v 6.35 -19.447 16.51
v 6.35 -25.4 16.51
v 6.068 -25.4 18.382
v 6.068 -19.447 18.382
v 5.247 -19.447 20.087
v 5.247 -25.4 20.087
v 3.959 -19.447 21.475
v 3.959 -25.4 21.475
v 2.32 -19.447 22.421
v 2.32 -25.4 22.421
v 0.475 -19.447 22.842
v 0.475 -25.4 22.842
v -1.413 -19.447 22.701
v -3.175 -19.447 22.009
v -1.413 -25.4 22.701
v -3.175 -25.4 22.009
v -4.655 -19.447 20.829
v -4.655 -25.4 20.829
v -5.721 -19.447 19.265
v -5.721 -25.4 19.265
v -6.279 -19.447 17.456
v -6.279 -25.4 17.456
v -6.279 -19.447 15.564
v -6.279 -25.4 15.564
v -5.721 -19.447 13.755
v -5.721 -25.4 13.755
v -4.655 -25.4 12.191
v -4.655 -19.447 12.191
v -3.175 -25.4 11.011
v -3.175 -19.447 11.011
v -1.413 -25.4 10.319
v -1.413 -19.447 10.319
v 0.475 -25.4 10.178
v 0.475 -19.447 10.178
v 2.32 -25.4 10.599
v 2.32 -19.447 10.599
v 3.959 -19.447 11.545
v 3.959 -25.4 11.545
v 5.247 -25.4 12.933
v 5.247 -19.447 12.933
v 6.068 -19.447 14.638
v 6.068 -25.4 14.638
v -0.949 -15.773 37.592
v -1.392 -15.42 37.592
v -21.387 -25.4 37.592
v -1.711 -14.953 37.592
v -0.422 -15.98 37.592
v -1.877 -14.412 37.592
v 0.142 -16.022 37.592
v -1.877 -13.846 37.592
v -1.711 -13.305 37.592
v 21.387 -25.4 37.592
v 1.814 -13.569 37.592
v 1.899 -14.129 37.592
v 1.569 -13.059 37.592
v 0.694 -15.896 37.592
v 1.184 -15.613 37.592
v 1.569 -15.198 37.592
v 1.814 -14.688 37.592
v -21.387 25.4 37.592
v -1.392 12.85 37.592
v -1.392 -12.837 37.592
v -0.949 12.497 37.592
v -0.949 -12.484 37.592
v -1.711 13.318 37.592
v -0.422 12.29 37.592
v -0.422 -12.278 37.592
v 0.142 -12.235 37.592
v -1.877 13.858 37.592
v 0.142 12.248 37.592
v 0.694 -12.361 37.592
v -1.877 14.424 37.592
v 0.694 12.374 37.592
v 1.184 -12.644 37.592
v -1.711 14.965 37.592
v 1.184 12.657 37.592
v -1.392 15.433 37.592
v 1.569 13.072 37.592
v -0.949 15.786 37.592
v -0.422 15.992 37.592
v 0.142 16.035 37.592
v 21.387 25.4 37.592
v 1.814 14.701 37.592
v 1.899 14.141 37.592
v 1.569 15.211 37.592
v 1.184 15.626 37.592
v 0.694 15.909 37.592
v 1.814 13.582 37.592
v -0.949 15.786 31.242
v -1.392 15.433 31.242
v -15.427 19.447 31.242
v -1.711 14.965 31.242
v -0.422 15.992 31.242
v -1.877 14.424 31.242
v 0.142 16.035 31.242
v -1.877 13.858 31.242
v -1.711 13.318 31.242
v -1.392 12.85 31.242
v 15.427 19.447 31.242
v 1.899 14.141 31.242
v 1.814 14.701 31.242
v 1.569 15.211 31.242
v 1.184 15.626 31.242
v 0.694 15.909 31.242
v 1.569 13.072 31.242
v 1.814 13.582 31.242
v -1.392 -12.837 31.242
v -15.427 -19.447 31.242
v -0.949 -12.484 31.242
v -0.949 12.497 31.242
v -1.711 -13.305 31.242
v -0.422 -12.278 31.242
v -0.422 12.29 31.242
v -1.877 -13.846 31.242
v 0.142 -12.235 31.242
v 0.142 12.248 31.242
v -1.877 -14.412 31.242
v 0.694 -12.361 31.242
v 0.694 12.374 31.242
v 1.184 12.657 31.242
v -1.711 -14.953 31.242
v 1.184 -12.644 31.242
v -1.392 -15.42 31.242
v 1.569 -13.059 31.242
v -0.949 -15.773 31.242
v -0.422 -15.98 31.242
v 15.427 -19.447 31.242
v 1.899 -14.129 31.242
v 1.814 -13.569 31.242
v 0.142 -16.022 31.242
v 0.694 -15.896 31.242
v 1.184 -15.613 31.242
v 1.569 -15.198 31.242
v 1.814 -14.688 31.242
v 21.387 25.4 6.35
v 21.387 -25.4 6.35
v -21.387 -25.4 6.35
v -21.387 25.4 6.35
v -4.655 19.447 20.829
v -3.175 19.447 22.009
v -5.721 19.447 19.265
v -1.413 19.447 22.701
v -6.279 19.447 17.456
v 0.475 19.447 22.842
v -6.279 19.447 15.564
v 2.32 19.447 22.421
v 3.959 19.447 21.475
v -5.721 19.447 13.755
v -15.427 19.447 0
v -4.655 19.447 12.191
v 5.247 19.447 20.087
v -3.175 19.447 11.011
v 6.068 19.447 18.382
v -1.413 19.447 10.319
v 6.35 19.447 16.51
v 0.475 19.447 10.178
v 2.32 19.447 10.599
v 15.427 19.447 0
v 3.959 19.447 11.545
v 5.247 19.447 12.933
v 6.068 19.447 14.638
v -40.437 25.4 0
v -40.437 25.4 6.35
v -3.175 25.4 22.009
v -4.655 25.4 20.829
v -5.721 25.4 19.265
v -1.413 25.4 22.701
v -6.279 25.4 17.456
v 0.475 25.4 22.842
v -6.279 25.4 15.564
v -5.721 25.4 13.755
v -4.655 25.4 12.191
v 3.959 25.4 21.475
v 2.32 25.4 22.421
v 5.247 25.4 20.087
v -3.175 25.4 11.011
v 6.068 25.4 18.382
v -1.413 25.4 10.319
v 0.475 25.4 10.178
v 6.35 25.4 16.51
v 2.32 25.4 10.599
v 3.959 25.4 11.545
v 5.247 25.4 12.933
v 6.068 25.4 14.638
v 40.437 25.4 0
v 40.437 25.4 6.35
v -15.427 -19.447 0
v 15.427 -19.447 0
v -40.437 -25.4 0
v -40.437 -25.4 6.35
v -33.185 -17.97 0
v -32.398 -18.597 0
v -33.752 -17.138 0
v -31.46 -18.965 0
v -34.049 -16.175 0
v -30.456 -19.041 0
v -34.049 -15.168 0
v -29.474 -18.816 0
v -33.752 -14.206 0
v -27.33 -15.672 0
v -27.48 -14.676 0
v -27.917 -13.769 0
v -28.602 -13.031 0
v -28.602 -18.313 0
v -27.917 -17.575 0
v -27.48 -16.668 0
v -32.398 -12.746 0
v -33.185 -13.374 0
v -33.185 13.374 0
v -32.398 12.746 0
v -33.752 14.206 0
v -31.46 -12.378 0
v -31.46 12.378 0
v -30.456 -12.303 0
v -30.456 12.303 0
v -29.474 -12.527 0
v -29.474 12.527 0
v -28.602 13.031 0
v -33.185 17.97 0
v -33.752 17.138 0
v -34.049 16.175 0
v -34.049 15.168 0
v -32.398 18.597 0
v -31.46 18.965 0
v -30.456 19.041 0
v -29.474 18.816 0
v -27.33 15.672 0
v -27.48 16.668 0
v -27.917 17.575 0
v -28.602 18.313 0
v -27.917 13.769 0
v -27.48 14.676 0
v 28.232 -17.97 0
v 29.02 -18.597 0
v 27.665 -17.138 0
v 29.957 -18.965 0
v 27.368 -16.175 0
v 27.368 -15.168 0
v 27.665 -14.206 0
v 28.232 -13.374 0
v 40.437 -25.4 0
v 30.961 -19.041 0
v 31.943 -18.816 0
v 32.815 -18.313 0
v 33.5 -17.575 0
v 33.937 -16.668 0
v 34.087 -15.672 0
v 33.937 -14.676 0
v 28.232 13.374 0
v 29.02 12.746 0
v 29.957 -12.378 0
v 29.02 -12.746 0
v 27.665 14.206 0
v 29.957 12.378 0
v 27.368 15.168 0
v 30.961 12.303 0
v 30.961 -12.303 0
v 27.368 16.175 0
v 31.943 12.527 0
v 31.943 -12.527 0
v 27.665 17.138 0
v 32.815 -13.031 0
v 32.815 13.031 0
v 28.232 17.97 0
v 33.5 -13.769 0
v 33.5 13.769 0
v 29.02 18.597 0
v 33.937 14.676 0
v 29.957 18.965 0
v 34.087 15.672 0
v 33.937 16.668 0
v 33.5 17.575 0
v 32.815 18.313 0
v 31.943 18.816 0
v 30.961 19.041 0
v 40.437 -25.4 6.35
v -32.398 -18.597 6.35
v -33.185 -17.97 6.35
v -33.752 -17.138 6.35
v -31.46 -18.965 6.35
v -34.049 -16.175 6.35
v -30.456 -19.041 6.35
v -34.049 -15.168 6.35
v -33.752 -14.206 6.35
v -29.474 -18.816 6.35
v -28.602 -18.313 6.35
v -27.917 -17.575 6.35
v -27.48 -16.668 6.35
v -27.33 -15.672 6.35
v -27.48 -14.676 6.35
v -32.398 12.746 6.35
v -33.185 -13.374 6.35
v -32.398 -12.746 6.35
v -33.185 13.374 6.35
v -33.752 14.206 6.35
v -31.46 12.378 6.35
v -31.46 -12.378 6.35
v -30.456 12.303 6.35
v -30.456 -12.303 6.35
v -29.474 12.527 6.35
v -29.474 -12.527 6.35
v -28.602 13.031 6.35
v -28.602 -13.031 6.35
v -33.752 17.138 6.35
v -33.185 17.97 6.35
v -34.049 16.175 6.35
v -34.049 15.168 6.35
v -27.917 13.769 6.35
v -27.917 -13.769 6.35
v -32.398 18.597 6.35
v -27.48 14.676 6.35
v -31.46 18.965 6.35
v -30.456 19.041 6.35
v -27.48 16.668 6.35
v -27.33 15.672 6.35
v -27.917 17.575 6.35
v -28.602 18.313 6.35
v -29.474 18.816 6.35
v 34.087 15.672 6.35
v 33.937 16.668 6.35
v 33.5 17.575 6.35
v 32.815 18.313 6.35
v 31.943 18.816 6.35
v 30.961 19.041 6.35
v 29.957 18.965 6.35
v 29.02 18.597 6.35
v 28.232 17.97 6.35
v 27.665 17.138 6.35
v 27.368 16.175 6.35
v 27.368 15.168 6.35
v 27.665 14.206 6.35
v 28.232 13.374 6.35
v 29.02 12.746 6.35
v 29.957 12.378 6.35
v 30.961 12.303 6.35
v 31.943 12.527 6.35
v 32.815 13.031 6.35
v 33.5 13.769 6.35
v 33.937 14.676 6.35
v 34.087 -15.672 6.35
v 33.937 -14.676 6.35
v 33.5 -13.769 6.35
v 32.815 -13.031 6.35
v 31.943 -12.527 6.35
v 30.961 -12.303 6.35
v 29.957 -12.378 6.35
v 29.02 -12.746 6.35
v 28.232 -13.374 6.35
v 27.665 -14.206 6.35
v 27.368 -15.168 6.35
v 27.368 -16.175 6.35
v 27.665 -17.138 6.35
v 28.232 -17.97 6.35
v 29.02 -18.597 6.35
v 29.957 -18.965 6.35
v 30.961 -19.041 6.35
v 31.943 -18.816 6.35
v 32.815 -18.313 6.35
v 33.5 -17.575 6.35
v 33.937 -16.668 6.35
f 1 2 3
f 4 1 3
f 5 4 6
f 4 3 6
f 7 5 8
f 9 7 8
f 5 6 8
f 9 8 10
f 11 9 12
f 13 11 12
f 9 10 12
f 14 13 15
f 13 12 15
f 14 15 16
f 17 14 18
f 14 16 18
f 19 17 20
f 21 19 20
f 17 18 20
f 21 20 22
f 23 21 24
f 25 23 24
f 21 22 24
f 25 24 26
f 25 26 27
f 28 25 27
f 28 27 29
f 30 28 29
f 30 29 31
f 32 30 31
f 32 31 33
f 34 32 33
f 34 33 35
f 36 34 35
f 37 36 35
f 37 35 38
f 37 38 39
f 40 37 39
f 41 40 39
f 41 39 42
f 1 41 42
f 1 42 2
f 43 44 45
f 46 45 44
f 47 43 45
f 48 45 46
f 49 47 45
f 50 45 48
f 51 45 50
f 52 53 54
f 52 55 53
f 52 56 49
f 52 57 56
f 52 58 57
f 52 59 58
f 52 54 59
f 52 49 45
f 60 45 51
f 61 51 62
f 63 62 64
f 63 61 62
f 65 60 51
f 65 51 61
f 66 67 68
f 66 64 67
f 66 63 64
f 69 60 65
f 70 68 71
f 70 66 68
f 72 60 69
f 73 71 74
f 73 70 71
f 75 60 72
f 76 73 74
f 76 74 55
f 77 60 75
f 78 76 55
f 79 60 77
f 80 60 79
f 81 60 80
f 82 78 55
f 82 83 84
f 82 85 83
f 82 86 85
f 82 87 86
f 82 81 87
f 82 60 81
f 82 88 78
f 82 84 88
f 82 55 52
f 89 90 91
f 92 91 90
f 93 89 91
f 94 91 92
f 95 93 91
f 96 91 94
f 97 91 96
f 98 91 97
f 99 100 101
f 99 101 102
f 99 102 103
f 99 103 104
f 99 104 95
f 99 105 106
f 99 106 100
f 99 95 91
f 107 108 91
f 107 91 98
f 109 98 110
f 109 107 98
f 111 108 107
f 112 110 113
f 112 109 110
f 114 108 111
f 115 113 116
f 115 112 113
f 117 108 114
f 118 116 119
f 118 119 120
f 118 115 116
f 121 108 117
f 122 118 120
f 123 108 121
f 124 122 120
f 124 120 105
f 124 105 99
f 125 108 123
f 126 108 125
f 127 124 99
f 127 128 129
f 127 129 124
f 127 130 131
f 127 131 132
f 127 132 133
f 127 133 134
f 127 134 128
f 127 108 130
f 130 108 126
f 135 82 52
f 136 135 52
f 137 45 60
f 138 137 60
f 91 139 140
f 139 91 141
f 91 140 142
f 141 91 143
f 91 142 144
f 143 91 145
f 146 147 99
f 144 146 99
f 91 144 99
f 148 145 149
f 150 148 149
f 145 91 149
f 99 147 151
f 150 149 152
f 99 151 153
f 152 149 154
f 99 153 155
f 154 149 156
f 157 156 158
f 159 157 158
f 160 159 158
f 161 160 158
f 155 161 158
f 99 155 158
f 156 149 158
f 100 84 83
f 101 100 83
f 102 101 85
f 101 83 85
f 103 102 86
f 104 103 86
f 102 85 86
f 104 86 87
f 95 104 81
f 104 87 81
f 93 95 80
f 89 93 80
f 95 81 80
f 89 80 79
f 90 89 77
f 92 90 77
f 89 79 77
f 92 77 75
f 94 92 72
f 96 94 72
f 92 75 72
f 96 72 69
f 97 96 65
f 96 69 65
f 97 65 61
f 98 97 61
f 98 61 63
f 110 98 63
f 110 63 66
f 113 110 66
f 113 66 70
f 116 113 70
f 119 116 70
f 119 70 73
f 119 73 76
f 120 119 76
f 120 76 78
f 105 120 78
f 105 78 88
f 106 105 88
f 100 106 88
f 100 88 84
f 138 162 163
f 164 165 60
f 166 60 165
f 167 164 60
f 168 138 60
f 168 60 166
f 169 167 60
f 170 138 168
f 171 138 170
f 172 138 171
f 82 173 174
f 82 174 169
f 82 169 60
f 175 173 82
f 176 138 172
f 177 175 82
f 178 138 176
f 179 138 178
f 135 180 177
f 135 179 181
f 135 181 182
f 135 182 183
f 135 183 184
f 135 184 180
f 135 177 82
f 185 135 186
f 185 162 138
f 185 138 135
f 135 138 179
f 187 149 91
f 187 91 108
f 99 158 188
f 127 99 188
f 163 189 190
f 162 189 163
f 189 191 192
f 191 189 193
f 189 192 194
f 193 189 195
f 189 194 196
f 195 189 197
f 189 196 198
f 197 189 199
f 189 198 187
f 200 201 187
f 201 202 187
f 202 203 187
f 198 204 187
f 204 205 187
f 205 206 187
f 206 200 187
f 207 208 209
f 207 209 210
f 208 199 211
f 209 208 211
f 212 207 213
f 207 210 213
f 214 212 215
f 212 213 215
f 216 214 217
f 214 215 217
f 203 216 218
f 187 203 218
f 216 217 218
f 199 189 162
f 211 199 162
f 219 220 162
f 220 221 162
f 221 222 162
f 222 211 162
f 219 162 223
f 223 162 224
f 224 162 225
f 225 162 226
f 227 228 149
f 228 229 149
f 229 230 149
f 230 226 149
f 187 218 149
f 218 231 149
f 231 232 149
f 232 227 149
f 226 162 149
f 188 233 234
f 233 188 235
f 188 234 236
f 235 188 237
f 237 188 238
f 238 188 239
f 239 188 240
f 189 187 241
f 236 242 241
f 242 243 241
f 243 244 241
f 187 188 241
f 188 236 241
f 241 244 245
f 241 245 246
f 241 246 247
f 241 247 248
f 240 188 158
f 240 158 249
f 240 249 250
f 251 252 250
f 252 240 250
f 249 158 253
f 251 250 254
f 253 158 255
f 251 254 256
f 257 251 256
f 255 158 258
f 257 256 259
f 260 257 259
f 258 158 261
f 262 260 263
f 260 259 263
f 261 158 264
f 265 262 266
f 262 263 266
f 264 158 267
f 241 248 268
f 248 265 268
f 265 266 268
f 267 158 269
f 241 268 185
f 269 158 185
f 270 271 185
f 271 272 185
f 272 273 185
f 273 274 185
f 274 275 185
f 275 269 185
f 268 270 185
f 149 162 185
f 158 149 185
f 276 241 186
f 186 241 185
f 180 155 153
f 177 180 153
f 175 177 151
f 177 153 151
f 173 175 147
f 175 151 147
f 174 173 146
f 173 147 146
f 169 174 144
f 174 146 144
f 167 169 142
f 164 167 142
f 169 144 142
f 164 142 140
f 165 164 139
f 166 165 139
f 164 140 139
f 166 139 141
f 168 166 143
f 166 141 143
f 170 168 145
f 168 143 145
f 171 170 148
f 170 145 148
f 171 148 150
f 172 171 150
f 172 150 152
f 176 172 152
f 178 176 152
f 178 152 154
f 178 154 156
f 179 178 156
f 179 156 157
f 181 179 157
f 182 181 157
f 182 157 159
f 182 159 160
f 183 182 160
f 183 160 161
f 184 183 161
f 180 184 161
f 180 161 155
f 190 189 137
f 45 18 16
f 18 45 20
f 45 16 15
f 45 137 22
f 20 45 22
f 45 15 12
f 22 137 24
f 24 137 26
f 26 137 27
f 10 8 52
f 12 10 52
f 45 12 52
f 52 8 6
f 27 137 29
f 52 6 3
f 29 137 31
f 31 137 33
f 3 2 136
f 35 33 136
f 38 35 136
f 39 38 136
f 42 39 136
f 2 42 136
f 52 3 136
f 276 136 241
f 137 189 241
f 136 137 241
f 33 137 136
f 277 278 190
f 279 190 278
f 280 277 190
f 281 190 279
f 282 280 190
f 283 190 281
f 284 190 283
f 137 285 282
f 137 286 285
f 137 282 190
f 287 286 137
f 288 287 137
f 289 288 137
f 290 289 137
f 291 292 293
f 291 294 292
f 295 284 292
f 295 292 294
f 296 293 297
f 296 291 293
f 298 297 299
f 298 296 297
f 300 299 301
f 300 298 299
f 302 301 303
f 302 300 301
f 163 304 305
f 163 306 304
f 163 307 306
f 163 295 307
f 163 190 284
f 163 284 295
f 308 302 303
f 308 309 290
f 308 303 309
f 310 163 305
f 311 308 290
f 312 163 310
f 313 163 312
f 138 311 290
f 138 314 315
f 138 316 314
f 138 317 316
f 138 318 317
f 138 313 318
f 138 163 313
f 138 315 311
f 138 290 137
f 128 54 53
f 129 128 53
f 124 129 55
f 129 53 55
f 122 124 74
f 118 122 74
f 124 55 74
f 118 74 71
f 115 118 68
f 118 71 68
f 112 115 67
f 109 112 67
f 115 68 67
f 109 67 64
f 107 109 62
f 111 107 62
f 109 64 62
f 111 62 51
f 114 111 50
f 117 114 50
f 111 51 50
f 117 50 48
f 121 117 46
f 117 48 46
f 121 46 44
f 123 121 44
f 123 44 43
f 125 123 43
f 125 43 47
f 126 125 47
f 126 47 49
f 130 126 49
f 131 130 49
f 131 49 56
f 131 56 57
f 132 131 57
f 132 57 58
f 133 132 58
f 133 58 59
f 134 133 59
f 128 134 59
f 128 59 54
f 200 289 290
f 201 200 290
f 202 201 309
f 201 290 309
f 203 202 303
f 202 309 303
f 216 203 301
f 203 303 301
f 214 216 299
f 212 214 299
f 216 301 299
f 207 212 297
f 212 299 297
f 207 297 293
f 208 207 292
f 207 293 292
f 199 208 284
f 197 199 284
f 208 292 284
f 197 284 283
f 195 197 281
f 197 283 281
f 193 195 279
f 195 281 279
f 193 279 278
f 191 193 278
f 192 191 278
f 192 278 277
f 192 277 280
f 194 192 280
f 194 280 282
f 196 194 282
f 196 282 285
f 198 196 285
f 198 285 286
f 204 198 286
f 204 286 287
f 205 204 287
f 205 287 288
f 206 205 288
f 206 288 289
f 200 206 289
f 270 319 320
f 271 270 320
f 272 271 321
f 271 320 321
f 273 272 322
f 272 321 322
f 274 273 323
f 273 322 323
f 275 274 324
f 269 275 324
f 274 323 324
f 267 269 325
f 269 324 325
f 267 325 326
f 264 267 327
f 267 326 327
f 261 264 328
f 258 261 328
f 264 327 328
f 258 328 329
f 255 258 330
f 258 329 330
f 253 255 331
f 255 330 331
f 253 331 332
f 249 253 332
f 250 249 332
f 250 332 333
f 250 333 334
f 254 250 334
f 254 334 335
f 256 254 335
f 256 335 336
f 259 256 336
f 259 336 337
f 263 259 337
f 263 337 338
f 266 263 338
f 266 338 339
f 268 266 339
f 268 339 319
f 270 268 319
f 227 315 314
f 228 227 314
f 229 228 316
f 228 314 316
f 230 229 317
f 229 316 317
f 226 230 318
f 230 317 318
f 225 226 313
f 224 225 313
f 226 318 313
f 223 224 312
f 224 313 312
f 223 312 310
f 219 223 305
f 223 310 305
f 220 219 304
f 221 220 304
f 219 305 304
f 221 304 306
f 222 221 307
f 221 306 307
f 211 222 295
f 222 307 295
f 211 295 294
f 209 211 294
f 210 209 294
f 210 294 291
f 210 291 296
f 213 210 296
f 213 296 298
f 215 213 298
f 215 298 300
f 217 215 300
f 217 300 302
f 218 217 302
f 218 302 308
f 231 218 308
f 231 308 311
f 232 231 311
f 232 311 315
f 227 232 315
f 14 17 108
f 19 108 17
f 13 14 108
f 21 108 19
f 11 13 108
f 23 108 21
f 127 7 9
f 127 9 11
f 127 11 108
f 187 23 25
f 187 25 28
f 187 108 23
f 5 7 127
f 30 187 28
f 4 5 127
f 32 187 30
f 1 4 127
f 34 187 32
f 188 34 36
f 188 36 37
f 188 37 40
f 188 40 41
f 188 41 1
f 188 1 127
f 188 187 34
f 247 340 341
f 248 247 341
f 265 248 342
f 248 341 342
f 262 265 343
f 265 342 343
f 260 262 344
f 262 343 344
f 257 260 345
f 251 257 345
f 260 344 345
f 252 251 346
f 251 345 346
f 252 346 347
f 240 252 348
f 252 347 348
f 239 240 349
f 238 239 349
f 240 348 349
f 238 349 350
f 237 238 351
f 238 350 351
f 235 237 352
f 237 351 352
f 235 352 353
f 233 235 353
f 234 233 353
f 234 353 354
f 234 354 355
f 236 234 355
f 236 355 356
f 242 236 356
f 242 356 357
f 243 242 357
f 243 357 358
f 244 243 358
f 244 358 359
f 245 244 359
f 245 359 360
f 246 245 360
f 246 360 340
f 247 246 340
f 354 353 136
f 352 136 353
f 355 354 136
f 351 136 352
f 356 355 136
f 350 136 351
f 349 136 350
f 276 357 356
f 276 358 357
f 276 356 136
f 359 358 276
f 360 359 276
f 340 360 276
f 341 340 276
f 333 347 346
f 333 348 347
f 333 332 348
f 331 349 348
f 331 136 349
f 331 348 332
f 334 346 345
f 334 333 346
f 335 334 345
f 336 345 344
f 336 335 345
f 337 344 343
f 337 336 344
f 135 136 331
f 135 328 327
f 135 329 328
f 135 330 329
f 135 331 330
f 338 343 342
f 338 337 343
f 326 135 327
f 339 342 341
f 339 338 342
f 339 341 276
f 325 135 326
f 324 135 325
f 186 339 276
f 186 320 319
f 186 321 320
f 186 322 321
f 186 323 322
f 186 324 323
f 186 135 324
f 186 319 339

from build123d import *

# Parameters (mm, degrees)
F0_W      = 80.8736
F0_H      = 50.8
F1_DEPTH  = 37.592
F3_DEPTH  = 31.242
F4_W      = 30.85465
F4_H      = 38.89375
F5_DEPTH  = 31.242
F6_R      = 6.35
F7_DEPTH  = 25400
F8_DEPTH  = 31.242
F9_R      = 1.89865
F10_DEPTH = 25.4
F11_R     = 3.3782
F12_DEPTH = 25.4


# Not quite as in the source:
# - a feature names something its author has since deleted; it is built from what else it names


with BuildPart() as f1:
    # F0 (on Top) → F1 (new body)
    with BuildSketch(Plane.XY):
        Rectangle(F0_W, F0_H)
    extrude(amount=F1_DEPTH)

    # F2 (on face) → F3 (cut)
    with BuildSketch(Plane.XY.offset(37.592)):
        Polygon((40.4368, 25.4), (21.3868, 25.4), (21.3868, 19.05), (21.3868, -19.05), (21.3868, -25.4), (40.4368, -25.4), (40.4368, -19.05), (40.4368, 19.05), align=None)
    extrude(amount=-F3_DEPTH, mode=Mode.SUBTRACT)

    # F4 (on face) → F5 (cut)
    with BuildSketch(Plane(origin=(0, 0, 0), x_dir=(1, 0, 0), z_dir=(0, 0, -1))):
        Rectangle(F4_W, F4_H)
    extrude(amount=-F5_DEPTH, mode=Mode.SUBTRACT)

    # F6 (on face) → F7 (cut)
    with BuildSketch(Plane.XZ.offset(25.4)):
        with Locations((0, 16.51)):
            Circle(F6_R)
    extrude(amount=-F7_DEPTH, mode=Mode.SUBTRACT)

    # F2 (on face) → F8 (cut)
    with BuildSketch(Plane.XY.offset(37.592)):
        Polygon((-40.4368, 25.4), (-40.4368, 19.05), (-40.4368, -19.05), (-40.4368, -25.4), (-21.3868, -25.4), (-21.3868, -19.05), (-21.3868, 19.05), (-21.3868, 25.4), align=None)
    extrude(amount=-F8_DEPTH, mode=Mode.SUBTRACT)

    # F9 (on face) → F10 (cut)
    with BuildSketch(Plane.XY.offset(37.592)):
        with Locations((0, 14.14145)):
            Circle(F9_R)
        with Locations((0, -14.12875)):
            Circle(F9_R)
    extrude(amount=-F10_DEPTH, mode=Mode.SUBTRACT)

    # F11 (on face) → F12 (cut)
    with BuildSketch(Plane.XY.offset(6.35)):
        with Locations((-30.7086, 15.6718)):
            Circle(F11_R)
        with Locations((-30.7086, -15.6718)):
            Circle(F11_R)
        with Locations((30.7086, 15.6718)):
            Circle(F11_R)
        with Locations((30.7086, -15.6718)):
            Circle(F11_R)
    extrude(amount=-F12_DEPTH, mode=Mode.SUBTRACT)


solid = f1.part
